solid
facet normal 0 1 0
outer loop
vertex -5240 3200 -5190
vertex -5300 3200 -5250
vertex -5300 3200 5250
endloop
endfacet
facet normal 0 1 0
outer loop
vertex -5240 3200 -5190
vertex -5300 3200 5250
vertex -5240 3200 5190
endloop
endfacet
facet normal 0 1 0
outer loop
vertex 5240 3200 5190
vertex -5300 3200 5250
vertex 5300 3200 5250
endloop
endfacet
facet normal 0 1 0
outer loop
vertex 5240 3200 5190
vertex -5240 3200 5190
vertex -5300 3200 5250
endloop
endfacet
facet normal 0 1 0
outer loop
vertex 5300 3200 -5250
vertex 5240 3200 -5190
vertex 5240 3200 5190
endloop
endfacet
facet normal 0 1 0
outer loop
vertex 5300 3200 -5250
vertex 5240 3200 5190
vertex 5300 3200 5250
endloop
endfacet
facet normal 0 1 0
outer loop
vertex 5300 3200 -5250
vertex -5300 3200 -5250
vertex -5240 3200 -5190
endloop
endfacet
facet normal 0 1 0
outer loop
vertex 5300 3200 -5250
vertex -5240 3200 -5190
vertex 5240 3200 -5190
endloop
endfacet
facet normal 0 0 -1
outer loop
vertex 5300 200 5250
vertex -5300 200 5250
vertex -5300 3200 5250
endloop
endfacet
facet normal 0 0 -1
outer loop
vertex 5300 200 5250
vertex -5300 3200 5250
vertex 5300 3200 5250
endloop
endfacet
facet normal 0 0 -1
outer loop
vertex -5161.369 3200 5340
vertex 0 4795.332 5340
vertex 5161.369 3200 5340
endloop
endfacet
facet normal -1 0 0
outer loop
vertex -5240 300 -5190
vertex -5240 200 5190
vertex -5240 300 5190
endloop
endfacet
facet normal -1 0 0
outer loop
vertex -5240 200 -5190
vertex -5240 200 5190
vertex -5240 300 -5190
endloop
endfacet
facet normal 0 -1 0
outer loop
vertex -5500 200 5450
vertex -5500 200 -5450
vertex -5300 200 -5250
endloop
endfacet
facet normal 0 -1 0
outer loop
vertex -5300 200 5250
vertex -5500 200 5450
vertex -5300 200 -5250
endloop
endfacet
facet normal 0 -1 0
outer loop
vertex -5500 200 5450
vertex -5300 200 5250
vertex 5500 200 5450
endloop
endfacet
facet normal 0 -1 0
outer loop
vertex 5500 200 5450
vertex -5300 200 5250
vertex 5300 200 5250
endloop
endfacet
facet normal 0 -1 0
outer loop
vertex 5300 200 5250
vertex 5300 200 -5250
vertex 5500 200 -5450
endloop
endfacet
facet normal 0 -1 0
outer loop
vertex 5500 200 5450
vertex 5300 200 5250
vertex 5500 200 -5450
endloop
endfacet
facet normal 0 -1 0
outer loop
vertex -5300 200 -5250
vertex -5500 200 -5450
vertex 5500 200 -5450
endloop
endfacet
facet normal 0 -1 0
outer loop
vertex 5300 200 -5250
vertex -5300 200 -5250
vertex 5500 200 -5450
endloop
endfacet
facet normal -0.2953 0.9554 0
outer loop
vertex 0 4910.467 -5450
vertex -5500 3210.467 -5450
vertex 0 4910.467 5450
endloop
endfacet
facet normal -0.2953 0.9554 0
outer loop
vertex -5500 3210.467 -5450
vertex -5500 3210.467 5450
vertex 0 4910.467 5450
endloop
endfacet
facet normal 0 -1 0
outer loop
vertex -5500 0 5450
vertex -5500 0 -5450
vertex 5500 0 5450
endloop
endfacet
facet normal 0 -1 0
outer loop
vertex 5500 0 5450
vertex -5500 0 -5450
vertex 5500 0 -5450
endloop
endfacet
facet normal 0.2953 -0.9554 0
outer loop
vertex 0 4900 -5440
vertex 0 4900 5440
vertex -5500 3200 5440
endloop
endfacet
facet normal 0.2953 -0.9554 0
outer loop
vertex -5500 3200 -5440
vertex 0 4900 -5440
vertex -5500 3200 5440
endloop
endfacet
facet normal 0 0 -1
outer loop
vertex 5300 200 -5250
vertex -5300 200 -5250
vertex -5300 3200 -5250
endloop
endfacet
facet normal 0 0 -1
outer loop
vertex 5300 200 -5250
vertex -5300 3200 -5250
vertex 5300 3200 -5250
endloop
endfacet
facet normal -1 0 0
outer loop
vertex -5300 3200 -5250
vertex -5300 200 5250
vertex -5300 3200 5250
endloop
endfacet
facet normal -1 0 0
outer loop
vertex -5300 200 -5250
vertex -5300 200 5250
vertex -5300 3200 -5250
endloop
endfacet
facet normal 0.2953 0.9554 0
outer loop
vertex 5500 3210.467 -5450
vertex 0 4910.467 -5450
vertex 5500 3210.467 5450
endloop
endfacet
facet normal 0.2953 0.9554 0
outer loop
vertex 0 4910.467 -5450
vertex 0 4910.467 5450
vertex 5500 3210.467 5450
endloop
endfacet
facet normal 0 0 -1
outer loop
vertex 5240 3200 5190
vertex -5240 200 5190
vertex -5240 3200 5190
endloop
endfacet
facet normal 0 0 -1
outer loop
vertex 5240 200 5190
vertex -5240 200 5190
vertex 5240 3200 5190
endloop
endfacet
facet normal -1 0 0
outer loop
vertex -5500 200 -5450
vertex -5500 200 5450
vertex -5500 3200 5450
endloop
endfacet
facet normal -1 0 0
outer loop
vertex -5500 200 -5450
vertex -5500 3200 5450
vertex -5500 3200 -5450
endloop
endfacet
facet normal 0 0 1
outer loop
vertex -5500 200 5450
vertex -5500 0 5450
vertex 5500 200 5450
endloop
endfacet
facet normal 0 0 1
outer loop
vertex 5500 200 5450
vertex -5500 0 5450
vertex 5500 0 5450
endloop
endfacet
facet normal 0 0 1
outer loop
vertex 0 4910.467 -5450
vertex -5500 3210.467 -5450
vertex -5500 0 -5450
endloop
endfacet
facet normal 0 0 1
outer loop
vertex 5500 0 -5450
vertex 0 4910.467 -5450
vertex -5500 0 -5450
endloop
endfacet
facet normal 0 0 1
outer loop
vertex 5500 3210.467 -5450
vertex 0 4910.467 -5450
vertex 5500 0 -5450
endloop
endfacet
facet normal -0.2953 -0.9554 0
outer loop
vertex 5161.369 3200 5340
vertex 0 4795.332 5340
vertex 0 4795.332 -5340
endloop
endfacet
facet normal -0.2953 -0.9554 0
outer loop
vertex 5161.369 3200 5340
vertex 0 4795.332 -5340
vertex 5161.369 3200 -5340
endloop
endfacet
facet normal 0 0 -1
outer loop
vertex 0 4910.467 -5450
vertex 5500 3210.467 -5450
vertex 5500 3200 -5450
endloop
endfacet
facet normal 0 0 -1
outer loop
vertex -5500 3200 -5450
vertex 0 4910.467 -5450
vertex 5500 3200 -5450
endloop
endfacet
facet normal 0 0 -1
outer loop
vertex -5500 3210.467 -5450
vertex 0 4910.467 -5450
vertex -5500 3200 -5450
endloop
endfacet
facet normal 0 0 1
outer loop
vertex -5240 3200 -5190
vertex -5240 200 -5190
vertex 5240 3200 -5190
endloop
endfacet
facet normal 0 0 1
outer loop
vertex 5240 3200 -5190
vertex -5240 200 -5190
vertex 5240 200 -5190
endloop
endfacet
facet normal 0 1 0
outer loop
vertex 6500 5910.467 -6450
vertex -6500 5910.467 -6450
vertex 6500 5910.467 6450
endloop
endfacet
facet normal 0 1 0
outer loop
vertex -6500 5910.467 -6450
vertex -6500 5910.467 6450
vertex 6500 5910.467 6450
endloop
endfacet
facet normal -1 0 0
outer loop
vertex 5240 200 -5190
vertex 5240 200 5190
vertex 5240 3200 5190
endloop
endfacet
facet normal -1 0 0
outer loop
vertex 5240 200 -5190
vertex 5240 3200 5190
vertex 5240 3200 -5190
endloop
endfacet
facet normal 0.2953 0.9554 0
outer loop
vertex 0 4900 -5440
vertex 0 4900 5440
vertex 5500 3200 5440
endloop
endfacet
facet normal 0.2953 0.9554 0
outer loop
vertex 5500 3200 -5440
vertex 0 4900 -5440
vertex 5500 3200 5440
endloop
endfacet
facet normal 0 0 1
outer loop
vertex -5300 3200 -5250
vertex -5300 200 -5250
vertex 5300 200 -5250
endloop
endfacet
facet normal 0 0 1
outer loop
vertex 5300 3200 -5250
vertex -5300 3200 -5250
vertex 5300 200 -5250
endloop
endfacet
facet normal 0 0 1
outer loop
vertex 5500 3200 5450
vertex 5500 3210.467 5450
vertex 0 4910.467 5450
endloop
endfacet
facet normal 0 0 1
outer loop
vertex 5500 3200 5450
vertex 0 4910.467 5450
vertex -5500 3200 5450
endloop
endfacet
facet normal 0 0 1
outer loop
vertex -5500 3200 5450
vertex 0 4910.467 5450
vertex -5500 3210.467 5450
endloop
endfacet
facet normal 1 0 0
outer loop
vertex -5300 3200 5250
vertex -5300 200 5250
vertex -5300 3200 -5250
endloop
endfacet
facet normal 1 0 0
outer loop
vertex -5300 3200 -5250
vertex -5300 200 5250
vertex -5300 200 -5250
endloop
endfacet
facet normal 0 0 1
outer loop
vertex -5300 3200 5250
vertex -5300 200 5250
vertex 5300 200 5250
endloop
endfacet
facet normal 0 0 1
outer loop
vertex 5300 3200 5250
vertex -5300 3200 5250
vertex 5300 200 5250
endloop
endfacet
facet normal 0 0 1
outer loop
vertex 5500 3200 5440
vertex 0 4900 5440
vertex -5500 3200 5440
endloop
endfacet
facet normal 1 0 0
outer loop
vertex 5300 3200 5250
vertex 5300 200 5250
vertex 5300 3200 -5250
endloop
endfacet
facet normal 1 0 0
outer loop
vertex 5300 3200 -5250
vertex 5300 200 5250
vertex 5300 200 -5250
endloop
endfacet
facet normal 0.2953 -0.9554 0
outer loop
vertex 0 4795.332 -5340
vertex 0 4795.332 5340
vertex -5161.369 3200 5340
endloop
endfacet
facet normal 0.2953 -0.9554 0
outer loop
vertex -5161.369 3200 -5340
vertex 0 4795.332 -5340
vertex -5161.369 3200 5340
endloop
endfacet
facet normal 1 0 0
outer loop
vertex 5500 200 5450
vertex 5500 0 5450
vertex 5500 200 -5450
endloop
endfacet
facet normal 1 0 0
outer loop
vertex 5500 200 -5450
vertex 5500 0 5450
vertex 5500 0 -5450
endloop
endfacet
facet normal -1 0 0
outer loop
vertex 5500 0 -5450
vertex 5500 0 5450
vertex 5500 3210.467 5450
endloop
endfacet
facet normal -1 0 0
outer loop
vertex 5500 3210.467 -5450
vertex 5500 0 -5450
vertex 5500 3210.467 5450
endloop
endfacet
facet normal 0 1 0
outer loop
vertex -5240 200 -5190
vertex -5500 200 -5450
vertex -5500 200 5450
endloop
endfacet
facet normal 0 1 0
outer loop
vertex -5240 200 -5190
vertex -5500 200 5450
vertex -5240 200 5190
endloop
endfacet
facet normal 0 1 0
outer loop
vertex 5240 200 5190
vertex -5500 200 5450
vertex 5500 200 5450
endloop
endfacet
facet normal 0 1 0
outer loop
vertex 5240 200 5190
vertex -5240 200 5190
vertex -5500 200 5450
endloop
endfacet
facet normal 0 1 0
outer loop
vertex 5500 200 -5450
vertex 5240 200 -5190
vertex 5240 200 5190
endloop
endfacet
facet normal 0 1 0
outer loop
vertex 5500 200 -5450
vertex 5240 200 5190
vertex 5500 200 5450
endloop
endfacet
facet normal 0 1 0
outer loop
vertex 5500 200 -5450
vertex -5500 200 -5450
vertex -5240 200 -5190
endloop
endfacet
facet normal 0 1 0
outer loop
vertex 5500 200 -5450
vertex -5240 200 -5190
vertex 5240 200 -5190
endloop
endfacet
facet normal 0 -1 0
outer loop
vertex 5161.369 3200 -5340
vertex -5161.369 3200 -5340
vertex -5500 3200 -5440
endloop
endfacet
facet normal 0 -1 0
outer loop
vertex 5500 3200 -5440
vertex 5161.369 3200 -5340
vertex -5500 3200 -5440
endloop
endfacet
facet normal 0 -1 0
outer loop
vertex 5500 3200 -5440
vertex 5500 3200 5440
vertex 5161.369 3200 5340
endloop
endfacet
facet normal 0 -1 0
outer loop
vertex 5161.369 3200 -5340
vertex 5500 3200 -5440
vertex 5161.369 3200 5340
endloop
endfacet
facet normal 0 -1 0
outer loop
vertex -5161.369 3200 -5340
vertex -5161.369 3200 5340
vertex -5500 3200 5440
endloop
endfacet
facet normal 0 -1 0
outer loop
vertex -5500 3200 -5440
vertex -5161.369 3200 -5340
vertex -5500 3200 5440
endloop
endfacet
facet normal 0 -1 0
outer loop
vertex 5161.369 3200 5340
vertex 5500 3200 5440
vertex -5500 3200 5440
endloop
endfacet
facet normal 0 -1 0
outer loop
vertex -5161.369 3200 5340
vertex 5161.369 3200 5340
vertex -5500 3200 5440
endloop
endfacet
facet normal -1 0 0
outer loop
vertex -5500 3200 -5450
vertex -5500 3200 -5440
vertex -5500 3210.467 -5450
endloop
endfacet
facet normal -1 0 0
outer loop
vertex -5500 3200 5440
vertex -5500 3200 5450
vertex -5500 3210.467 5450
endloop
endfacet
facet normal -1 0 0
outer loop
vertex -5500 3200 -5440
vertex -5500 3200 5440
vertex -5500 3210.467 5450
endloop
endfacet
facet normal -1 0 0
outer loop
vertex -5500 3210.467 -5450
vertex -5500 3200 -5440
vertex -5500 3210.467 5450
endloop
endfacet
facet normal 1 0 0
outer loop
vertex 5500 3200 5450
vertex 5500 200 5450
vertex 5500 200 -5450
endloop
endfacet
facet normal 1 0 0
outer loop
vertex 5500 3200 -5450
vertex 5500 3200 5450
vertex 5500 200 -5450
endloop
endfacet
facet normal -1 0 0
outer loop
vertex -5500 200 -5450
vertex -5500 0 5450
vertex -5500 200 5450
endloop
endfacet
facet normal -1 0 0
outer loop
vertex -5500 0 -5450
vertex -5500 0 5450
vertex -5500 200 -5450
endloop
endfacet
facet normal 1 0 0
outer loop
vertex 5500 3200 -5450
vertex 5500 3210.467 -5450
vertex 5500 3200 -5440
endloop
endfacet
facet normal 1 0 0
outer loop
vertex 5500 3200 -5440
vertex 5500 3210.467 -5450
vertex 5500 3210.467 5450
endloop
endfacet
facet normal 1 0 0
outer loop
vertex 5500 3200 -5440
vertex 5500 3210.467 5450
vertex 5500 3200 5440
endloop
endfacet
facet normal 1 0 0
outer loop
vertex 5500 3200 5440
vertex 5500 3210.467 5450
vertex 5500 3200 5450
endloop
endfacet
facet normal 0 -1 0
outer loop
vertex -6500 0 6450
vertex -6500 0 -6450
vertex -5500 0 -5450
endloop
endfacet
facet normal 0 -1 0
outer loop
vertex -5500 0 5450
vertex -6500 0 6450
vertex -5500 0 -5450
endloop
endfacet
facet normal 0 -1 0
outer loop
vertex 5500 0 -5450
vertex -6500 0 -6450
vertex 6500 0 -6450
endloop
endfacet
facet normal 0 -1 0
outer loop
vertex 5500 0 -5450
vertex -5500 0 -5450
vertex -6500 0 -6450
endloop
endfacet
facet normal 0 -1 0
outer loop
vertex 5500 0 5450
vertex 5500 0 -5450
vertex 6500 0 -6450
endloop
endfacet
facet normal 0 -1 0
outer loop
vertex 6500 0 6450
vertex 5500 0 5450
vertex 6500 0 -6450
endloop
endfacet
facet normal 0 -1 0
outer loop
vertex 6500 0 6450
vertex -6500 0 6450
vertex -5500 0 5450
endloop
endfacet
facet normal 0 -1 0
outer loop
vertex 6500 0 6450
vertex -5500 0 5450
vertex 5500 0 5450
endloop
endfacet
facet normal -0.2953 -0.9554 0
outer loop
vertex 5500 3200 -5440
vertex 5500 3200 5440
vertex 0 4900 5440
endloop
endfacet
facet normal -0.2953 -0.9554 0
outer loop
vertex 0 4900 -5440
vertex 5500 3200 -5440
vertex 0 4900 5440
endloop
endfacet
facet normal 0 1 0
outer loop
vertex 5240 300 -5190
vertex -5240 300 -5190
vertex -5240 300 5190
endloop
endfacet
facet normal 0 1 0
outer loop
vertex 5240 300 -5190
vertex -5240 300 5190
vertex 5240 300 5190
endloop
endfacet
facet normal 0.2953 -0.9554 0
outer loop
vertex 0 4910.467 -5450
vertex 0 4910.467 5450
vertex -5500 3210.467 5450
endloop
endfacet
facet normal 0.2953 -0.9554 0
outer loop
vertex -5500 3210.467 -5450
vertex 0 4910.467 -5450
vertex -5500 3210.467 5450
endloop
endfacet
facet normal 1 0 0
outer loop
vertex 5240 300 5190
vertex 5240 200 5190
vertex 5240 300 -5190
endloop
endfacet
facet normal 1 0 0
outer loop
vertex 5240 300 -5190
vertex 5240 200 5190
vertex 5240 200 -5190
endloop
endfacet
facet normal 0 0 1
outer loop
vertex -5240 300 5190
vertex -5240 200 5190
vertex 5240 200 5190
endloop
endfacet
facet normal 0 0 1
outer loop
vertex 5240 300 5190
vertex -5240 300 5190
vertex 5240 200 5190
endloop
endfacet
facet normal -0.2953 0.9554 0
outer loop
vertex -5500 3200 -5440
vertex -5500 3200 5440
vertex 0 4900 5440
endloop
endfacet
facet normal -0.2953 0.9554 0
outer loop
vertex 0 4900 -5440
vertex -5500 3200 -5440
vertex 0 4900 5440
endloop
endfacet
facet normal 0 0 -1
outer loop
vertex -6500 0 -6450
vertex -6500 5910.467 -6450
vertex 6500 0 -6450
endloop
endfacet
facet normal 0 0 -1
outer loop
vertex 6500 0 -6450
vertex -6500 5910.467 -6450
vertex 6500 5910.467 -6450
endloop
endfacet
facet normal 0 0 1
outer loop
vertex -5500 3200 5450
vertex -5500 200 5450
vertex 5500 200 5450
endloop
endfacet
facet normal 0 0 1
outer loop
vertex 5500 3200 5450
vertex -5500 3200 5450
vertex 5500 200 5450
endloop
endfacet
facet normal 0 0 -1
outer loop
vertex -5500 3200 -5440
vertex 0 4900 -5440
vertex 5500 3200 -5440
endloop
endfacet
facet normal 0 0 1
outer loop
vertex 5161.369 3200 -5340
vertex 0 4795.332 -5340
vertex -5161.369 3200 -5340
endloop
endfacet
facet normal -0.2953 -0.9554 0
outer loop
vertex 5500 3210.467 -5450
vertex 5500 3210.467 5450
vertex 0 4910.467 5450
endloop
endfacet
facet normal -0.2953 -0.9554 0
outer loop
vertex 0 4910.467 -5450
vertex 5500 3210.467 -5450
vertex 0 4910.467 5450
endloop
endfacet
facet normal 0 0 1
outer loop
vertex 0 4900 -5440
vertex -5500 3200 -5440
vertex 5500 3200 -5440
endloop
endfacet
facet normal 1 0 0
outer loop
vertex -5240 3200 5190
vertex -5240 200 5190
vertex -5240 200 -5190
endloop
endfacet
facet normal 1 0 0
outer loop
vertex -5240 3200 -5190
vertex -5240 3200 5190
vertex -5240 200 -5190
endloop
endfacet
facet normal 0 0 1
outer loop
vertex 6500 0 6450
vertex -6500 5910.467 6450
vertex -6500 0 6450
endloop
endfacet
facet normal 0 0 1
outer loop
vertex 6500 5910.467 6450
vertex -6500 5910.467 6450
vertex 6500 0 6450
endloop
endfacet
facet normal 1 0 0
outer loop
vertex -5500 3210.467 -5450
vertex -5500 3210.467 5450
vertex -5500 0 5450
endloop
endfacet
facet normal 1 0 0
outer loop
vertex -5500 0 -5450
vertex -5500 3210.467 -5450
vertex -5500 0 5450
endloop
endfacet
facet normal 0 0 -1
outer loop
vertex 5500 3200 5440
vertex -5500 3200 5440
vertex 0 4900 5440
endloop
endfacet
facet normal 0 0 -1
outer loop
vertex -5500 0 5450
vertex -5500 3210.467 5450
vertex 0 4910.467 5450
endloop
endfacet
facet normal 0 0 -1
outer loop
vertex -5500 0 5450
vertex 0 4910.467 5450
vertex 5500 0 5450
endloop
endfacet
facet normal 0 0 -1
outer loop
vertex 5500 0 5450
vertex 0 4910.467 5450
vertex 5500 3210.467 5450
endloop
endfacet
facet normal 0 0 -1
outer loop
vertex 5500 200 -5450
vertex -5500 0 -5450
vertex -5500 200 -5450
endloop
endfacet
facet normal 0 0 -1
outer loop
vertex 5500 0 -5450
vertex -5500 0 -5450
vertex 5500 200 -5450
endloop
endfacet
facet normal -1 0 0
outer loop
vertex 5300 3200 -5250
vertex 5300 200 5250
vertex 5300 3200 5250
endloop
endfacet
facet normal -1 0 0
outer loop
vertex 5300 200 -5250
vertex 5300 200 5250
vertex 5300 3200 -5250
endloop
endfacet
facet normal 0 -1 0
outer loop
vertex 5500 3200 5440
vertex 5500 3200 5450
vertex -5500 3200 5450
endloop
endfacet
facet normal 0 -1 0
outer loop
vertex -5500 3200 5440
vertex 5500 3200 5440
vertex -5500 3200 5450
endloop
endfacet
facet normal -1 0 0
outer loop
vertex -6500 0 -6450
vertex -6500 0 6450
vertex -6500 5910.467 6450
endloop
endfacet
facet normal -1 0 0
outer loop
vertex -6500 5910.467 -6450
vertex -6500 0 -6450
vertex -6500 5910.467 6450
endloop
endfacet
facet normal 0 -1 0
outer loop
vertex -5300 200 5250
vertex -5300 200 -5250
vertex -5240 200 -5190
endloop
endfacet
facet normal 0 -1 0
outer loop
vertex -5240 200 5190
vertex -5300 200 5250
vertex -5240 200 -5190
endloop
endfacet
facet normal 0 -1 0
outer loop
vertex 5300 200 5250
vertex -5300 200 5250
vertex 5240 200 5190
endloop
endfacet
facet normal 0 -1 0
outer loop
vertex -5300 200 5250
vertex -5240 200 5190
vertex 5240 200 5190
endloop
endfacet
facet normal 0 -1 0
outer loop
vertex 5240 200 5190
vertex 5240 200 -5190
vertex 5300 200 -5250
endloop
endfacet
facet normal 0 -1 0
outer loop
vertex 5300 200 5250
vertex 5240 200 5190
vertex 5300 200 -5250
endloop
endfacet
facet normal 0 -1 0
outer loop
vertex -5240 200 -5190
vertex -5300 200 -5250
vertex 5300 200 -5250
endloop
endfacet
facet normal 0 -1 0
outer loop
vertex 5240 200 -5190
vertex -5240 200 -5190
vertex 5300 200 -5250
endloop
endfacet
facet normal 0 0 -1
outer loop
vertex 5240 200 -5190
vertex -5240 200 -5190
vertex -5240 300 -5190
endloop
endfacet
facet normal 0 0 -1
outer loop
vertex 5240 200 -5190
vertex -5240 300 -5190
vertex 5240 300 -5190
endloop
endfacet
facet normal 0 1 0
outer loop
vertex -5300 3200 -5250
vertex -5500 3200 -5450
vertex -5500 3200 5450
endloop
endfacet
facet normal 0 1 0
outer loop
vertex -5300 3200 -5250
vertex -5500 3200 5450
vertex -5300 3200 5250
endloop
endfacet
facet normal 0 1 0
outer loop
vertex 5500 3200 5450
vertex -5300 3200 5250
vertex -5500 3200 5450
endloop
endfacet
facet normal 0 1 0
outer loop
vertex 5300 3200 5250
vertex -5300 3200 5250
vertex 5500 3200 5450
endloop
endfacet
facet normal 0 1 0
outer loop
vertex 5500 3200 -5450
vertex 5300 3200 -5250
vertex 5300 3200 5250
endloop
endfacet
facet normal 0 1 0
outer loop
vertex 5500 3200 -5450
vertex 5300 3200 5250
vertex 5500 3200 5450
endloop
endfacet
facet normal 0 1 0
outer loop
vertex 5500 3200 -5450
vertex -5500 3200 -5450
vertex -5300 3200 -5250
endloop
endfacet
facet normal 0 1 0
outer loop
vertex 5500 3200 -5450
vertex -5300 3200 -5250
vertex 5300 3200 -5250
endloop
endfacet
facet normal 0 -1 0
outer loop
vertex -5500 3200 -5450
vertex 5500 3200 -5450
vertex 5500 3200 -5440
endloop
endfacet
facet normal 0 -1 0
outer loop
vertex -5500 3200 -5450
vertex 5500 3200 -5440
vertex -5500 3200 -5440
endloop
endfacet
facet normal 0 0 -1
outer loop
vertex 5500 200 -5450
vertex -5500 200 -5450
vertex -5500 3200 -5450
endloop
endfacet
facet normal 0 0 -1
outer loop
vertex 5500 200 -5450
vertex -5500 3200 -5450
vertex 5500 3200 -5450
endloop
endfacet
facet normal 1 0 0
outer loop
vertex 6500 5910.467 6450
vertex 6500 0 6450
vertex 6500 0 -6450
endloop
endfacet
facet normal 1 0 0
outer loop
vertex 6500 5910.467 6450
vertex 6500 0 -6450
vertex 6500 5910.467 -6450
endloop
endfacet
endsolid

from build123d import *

# Parameters (mm, degrees)
SKETCH1_W              = 11000
SKETCH1_H              = 10900
PISO_DEPTH             = 200
SKETCH2_W              = 11000
SKETCH2_H              = 10900
SKETCH2_W_2            = 10600
SKETCH2_H_2            = 10500
PAREDES_DEPTH          = 3000
SKETCH7_W              = 10600
SKETCH7_H              = 10500
SKETCH7_W_2            = 10480
SKETCH7_H_2            = 10380
AISLANTE_PAREDES_DEPTH = 3000
SKETCH27_W             = 10480
SKETCH27_H             = 10380
AISLANTE_SUELO_DEPTH   = 100
L_MINA_TRASERA_DEPTH   = 10
L_MINA_EXTERIOR_DEPTH  = 5450
BOSS_EXTRUDE24_DEPTH   = 100
BOSS_EXTRUDE34_DEPTH   = 10680
BOSS_EXTRUDE35_REACH   = 13070.542
BOSS_EXTRUDE36_REACH   = 12946.971
SKETCH45_W             = 10480
SKETCH45_H             = 2900
EXTERIOR_P1_DEPTH      = 10900
SKETCH50_W             = 13000
SKETCH50_H             = 5910.466791247
EXTERIOR_P2_DEPTH      = 1000


with BuildPart() as part:
    # Sketch1 → Piso (new body)
    with BuildSketch(Plane(origin=(0, 0, 0), x_dir=(1, 0, 0), z_dir=(0, 1, 0))):
        Rectangle(SKETCH1_W, SKETCH1_H)
    extrude(amount=PISO_DEPTH)


with BuildPart() as body_2:
    # Sketch2 → Paredes (new body)
    with BuildSketch(Plane(origin=(0, 200, 0), x_dir=(1, 0, 0), z_dir=(0, 1, 0))):
        Rectangle(SKETCH2_W, SKETCH2_H)
        Rectangle(SKETCH2_W_2, SKETCH2_H_2, mode=Mode.SUBTRACT)
    extrude(amount=PAREDES_DEPTH)


with BuildPart() as body_3:
    # Sketch7 → Aislante Paredes (new body)
    with BuildSketch(Plane(origin=(0, 200, 0), x_dir=(1, 0, 0), z_dir=(0, 1, 0))):
        Rectangle(SKETCH7_W, SKETCH7_H)
        Rectangle(SKETCH7_W_2, SKETCH7_H_2, mode=Mode.SUBTRACT)
    extrude(amount=AISLANTE_PAREDES_DEPTH)


with BuildPart() as body_4:
    # Sketch27 → Aislante suelo (new body)
    with BuildSketch(Plane(origin=(0, 200, 0), x_dir=(1, 0, 0), z_dir=(0, 1, 0))):
        Rectangle(SKETCH27_W, SKETCH27_H)
    extrude(amount=AISLANTE_SUELO_DEPTH)

    # Piso&aislante: union part
    add(part.part)


with BuildPart() as body_5:
    # Sketch20 → Lámina Trasera (new body)
    with BuildSketch(Plane(origin=(0, 0, -5450), x_dir=(1, 0, 0), z_dir=(0, 0, -1))):
        Polygon((0, -4900), (5500, -3200), (-5500, -3200), align=None)
    extrude(amount=-L_MINA_TRASERA_DEPTH)


with BuildPart() as body_6:
    # Lámina Frontal: mirrored copy
    add(body_5.part.mirror(Plane.XY))


with BuildPart() as body_7:
    # Sketch48 → Lámina Exterior (new, symmetric)
    with BuildSketch(Plane.XY):
        Polygon((-5500, 3200), (-5500, 3210.466791247), (0, 4910.466791247), (5500, 3210.466791247), (5500, 3200), (0, 4900), align=None)
    extrude(amount=L_MINA_EXTERIOR_DEPTH, both=True)


with BuildPart() as body_8:
    # Sketch35 → Boss-Extrude24 (new body)
    with BuildSketch(Plane.XY.offset(-5440)):
        Polygon((-5500, 3200), (0, 4900), (5500, 3200), align=None)
    extrude(amount=BOSS_EXTRUDE24_DEPTH)


with BuildPart() as body_9:
    # Mirror3: mirrored copy
    add(body_8.part.mirror(Plane.XY))


with BuildPart() as body_10:
    # Sketch43 → Boss-Extrude34 (new body)
    with BuildSketch(Plane(origin=(0, 0, 5340), x_dir=(-1, 0, 0), z_dir=(0, 0, -1))):
        Polygon((0, 4900), (0, 4795.33208753), (-5161.368518479, 3200), (-5500, 3200), align=None)
    extrude(amount=BOSS_EXTRUDE34_DEPTH)


with BuildPart() as body_11:
    # Mirror8: mirrored copy
    add(body_10.part.mirror(Plane(origin=(0, 0, 0), x_dir=(0, 0, 1), z_dir=(1, 0, 0))))

    # Combine_Aislante: union body 10, body 8, body 9
    add(body_10.part)
    add(body_8.part)
    add(body_9.part)


with BuildPart() as body_5_1:
    add(body_5.part)

    # Combine_Laminas: union body 6, body 7
    add(body_6.part)
    add(body_7.part)


with BuildPart() as body_7_2:

    # Sketch44 → Boss-Extrude35 (new, up to next)
    with BuildSketch(Plane(origin=(0, 0, 5340), x_dir=(-1, 0, 0), z_dir=(0, 0, -1)), mode=Mode.PRIVATE) as boss_extrude35_sk1:
        Polygon((-5161.368518479, 3200), (0, 4795.33208753), (5161.368518479, 3200), align=None)
    boss_extrude35_tool1 = extrude(boss_extrude35_sk1.sketch, amount=BOSS_EXTRUDE35_REACH, mode=Mode.PRIVATE) - body_11.part
    add(boss_extrude35_tool1.solids().sort_by_distance((0, 3731.777363, 5340))[0])


    # Sketch45 → Boss-Extrude36 (add, up to next)
    with BuildSketch(Plane(origin=(0, 0, 5190), x_dir=(-1, 0, 0), z_dir=(0, 0, -1)), mode=Mode.PRIVATE) as boss_extrude36_sk1:
        with Locations((0, 1750)):
            Rectangle(SKETCH45_W, SKETCH45_H)
    boss_extrude36_tool1 = extrude(boss_extrude36_sk1.sketch, amount=BOSS_EXTRUDE36_REACH, mode=Mode.PRIVATE) - body_3.part
    add(boss_extrude36_tool1.solids().sort_by_distance((0, 1750, 5190))[0])


with BuildPart() as body_6_2:
    # Sketch49 → Exterior_p1 (new body)
    with BuildSketch(Plane.XY.offset(5450)):
        Polygon((-5500, 0), (-6500, 0), (-6500, 5910.466791247), (6500, 5910.466791247), (6500, 0), (5500, 0), (5500, 3210.466791247), (0, 4910.466791247), (-5500, 3210.466791247), align=None)
    extrude(amount=-EXTERIOR_P1_DEPTH)


with BuildPart() as body_7_3:
    # Sketch50 → Exterior_p2 (new body)
    with BuildSketch(Plane.XY.offset(5450)):
        with Locations((0, 2955.233395624)):
            Rectangle(SKETCH50_W, SKETCH50_H)
    extrude(amount=EXTERIOR_P2_DEPTH)


with BuildPart() as body_8_2:
    # Mirror10: mirrored copy
    add(body_7_3.part.mirror(Plane.XY))


with BuildPart() as body_7_3_1:
    add(body_7_3.part)

    # Exterior: union body 6 2, body 8 2
    add(body_6_2.part)
    add(body_8_2.part)


solid = Compound([body_2.part, body_3.part, body_4.part, body_11.part, body_5_1.part, body_7_3_1.part])
